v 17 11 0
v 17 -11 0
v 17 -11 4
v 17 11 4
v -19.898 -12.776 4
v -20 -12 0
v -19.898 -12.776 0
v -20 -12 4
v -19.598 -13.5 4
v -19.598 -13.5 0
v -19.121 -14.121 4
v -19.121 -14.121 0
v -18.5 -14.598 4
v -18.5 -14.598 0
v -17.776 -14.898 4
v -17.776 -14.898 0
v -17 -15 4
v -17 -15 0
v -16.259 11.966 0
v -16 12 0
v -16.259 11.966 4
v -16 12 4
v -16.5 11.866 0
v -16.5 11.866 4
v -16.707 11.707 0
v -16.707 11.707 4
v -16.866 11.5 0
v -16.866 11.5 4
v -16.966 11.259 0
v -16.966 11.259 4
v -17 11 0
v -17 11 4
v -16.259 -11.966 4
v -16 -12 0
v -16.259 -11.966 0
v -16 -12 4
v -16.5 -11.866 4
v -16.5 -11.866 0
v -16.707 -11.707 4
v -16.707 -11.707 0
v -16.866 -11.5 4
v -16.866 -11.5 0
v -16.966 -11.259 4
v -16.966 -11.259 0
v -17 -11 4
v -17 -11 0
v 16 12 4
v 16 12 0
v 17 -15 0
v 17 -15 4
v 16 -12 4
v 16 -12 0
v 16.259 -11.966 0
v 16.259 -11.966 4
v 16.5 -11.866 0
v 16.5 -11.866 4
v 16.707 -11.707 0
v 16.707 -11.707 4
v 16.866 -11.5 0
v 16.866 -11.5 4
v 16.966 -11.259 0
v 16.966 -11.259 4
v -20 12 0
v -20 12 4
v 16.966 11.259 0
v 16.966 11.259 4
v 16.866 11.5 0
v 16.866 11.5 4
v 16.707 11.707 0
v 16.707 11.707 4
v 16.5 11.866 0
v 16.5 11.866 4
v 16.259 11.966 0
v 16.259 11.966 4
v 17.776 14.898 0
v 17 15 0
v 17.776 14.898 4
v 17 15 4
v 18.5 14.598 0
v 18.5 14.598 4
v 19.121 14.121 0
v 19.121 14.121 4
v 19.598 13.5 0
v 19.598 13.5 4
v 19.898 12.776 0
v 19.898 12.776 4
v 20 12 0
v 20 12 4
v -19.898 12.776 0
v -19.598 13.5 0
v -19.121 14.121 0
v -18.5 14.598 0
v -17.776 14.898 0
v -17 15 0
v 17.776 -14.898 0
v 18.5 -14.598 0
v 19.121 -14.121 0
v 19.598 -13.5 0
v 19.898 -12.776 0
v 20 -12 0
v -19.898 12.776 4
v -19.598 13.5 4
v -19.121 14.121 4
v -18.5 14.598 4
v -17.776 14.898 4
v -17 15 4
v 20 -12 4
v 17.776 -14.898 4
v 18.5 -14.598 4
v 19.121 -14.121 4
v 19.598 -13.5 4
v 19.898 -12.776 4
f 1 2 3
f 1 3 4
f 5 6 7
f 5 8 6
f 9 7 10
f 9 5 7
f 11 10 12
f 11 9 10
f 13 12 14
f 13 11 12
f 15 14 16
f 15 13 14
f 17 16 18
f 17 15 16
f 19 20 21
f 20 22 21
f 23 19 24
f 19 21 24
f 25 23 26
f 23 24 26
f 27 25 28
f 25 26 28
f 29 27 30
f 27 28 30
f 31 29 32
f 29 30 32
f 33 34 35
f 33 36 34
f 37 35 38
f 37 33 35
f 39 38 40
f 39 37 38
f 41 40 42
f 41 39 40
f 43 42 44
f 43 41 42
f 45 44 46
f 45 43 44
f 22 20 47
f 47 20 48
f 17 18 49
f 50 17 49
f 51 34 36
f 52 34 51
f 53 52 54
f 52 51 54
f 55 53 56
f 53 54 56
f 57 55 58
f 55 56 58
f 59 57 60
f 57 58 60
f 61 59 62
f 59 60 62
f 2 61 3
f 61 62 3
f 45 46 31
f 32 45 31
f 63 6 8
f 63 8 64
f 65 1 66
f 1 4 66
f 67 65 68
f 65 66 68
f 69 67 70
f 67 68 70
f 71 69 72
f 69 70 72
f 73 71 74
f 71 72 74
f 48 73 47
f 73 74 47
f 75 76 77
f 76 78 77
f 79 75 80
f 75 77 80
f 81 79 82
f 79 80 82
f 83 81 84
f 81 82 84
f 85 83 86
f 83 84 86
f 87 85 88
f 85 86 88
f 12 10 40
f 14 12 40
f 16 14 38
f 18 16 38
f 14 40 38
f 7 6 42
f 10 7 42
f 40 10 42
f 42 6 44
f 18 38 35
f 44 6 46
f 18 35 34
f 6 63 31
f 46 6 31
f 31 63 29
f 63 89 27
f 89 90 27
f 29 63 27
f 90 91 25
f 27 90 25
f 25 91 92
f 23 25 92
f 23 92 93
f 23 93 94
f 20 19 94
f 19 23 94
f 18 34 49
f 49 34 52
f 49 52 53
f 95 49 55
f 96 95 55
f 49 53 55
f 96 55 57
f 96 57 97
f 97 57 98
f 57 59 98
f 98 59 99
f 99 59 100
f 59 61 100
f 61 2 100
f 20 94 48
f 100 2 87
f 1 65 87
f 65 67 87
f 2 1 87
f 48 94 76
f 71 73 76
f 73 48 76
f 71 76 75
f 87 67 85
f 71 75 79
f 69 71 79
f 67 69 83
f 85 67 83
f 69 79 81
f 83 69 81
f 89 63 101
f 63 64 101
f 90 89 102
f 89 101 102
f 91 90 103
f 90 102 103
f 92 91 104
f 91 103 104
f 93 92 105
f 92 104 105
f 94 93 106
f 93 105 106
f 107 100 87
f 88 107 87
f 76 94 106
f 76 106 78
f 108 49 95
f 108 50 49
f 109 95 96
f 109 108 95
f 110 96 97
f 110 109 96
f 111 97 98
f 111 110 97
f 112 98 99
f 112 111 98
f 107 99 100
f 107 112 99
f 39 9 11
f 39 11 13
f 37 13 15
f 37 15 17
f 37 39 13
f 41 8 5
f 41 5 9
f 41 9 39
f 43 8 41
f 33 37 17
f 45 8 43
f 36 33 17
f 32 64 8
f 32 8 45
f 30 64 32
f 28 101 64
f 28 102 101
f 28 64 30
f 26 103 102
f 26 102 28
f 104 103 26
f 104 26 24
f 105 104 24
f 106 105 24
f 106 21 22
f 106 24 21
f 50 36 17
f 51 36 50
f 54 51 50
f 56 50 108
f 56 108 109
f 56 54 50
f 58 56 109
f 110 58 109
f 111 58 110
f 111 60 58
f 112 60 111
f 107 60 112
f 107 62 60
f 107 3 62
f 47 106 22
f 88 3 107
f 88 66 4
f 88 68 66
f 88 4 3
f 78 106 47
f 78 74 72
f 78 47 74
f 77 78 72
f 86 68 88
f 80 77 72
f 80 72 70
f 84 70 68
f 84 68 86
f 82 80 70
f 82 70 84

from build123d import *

# Parameters (mm, degrees)
SKETCH_W    = 40
SKETCH_H    = 30
SKETCH_W_2  = 34
SKETCH_H_2  = 24
PAD_DEPTH   = 4
FILLET_R    = 3
FILLET001_R = 1


with BuildPart() as part:
    # Sketch → Pad (new body)
    with BuildSketch(Plane.XY):
        Rectangle(SKETCH_W, SKETCH_H)
        Rectangle(SKETCH_W_2, SKETCH_H_2, mode=Mode.SUBTRACT)
    extrude(amount=PAD_DEPTH)

    # Fillet
    fillet_edges = [part.edges().sort_by_distance(p)[0] for p in [
        (-20, -15, 2),
        (20, -15, 2),
        (20, 15, 2),
        (-20, 15, 2),
    ]]
    fillet(fillet_edges, radius=FILLET_R)

    # Fillet001
    fillet001_edges = [part.edges().sort_by_distance(p)[0] for p in [
        (17, 12, 2),
        (-17, 12, 2),
        (-17, -12, 2),
        (17, -12, 2),
    ]]
    fillet(fillet001_edges, radius=FILLET001_R)


solid = part.part
